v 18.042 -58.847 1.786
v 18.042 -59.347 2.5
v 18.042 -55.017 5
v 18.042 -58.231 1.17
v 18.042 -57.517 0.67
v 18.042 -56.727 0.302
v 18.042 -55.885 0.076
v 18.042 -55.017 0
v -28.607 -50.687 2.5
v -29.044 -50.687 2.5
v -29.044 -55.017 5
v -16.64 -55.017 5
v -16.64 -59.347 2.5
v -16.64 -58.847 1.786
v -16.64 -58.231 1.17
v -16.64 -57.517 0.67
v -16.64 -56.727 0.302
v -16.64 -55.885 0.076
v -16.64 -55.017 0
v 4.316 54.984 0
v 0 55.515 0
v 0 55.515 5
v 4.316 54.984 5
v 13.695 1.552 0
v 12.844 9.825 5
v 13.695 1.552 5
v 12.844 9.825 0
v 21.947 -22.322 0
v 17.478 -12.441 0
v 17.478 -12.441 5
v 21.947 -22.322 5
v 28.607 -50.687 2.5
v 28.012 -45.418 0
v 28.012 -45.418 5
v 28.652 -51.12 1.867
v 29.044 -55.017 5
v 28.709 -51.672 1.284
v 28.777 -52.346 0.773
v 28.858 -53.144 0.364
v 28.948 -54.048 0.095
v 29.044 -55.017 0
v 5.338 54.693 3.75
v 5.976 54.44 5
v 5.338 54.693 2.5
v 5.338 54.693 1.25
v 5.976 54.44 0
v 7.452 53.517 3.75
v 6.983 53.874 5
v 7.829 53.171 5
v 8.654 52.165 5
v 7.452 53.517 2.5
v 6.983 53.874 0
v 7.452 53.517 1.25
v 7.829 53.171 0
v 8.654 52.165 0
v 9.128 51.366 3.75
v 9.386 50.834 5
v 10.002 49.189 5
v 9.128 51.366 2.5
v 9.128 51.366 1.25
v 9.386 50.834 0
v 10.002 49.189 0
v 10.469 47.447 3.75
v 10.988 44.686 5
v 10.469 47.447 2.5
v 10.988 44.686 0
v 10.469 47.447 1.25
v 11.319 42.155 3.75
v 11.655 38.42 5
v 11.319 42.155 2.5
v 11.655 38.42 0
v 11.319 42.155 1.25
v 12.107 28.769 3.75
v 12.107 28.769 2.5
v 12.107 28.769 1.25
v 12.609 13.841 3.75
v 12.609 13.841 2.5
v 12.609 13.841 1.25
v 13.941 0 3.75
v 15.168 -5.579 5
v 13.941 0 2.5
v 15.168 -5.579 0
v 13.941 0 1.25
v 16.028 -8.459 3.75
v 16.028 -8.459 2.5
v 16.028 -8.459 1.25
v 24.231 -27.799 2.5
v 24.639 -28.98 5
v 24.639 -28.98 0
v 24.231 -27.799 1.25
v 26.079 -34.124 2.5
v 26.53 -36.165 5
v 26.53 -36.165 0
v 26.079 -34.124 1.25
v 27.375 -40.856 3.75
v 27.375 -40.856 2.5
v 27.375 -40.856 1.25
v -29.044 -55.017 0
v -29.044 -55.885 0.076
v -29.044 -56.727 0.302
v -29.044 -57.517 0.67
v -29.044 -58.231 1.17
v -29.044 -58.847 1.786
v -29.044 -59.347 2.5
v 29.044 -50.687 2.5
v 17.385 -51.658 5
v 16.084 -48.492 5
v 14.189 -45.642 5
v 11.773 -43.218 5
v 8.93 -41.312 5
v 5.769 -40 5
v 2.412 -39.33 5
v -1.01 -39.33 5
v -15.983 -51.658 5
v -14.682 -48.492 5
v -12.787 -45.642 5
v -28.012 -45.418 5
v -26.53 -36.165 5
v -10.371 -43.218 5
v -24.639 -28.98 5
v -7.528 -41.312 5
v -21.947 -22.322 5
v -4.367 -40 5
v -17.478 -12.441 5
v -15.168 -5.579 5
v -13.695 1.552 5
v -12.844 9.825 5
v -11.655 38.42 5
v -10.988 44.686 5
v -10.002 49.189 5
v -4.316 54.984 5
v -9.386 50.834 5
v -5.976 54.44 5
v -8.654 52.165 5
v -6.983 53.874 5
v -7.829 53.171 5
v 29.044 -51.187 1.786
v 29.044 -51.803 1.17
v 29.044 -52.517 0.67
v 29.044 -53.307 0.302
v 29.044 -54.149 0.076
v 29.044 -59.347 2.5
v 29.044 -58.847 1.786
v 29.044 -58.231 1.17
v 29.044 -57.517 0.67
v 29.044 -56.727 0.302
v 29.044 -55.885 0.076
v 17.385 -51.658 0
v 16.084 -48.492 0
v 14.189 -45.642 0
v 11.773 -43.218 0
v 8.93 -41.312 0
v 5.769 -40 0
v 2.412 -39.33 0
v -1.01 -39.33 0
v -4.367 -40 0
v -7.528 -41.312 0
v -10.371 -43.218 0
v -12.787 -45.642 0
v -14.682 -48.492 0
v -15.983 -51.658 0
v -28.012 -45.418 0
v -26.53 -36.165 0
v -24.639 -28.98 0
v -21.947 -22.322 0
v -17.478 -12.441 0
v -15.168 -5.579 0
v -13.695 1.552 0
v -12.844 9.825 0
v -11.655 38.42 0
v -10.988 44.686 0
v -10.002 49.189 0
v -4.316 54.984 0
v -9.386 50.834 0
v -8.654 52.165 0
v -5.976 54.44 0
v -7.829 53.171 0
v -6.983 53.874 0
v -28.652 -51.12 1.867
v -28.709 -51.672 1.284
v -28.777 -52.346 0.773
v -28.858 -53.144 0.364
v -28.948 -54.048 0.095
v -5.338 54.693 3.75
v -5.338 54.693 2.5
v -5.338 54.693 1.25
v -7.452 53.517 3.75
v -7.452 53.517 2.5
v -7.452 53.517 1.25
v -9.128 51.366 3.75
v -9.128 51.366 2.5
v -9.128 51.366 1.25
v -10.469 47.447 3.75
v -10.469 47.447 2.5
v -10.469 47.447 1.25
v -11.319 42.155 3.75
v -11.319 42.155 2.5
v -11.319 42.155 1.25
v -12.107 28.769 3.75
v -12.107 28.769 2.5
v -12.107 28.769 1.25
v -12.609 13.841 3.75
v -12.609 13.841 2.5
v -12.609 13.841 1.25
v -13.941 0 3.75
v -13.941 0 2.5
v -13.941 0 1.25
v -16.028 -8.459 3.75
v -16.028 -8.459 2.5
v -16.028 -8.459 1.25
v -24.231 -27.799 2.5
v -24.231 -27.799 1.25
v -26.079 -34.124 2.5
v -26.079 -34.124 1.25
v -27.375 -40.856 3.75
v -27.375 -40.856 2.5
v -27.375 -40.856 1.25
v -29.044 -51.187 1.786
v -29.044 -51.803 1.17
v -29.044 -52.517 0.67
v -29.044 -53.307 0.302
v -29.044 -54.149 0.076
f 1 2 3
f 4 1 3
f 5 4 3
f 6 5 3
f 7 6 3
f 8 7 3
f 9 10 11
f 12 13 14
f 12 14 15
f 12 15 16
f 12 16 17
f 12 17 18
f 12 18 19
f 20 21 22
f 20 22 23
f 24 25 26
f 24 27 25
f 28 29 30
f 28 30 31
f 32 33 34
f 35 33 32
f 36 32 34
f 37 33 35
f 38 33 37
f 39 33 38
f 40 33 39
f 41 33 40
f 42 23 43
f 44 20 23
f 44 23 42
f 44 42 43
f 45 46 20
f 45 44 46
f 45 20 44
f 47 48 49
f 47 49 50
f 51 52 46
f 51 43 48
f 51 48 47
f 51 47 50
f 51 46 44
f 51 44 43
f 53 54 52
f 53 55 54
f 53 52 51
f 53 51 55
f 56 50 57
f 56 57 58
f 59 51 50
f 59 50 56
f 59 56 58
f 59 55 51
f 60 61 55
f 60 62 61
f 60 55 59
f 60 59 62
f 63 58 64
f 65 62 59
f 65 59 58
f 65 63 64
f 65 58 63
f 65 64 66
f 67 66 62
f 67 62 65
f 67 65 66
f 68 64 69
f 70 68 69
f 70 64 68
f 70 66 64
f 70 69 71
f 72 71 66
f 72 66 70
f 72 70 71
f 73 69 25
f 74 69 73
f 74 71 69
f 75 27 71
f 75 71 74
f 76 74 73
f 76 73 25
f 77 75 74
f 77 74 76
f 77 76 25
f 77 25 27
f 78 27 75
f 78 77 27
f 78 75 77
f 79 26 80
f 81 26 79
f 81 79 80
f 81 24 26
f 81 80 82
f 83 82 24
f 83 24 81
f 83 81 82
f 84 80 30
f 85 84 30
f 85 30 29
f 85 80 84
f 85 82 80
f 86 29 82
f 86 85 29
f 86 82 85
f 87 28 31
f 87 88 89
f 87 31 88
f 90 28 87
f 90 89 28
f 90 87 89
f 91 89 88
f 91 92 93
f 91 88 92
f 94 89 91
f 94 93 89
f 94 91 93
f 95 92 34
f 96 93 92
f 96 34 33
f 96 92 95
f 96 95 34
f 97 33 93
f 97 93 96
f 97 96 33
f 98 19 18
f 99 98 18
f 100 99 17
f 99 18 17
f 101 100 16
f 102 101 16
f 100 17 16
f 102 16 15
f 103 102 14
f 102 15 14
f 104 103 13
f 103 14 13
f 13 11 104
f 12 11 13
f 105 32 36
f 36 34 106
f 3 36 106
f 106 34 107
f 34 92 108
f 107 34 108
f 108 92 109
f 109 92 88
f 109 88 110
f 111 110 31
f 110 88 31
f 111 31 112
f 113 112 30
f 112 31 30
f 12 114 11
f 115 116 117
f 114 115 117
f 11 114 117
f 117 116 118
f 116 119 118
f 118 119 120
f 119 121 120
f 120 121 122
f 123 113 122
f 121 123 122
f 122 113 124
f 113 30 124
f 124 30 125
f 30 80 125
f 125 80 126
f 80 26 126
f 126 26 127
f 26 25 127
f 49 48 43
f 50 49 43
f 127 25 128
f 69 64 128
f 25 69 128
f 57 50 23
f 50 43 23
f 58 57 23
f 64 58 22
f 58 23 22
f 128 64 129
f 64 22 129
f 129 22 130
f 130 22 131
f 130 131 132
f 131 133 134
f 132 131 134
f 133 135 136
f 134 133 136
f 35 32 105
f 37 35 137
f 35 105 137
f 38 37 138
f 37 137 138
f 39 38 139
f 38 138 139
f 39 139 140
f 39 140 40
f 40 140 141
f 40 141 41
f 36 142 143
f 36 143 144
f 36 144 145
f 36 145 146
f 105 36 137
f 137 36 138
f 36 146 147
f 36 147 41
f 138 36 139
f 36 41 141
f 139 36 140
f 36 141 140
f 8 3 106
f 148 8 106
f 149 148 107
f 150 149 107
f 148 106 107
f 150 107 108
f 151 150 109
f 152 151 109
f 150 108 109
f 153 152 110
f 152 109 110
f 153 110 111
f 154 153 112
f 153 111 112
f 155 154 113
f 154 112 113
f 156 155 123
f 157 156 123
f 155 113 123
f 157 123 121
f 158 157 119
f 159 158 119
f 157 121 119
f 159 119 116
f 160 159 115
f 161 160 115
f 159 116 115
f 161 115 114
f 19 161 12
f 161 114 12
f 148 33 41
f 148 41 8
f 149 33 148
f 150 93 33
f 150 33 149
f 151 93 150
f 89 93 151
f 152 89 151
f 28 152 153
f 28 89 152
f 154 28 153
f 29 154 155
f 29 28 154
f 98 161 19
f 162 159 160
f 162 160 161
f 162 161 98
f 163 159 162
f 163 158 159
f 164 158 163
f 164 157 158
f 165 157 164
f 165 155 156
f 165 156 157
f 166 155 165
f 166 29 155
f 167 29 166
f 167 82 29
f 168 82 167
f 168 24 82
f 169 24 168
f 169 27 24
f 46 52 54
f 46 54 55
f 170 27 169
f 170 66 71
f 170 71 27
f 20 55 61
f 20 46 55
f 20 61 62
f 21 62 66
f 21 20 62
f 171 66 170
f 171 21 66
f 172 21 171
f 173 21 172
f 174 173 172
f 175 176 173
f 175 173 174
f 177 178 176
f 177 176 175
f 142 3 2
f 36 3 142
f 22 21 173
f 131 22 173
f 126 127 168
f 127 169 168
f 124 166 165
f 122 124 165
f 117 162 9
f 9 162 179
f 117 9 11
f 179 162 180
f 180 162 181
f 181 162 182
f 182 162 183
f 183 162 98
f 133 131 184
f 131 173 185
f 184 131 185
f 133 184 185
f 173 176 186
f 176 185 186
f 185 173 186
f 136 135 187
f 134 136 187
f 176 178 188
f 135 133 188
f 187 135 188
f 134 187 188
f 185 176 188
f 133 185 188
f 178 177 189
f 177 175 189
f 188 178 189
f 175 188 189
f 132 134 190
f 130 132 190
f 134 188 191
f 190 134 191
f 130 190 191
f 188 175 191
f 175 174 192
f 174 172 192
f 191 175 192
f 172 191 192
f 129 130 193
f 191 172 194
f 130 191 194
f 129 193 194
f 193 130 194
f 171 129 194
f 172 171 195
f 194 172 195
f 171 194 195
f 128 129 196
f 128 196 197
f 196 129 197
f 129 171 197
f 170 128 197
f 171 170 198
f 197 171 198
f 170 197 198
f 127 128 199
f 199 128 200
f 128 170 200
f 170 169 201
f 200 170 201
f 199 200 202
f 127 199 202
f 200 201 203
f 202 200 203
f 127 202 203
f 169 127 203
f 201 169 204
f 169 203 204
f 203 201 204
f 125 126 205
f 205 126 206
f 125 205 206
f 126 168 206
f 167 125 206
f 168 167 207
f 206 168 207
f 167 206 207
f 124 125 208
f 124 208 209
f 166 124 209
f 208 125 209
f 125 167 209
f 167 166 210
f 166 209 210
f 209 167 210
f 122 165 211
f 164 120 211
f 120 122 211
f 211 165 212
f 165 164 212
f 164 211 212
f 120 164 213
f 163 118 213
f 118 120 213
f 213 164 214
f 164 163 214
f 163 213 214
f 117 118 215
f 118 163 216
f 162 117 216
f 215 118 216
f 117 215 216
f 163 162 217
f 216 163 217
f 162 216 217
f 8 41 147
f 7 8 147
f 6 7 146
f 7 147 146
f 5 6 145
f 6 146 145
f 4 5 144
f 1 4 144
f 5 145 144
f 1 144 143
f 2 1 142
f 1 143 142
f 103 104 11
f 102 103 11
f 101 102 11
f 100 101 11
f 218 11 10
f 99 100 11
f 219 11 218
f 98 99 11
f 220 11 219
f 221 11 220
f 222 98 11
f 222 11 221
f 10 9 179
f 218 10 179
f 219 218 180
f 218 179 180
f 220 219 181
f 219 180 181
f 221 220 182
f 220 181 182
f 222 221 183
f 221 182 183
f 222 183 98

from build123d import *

# Parameters (mm, degrees)
F1_DEPTH      = 5
F3_DEPTH      = 25
F3_FACE_W     = 12.4035850167
F3_FACE_H     = 5
F3_FACE_W_2   = 11.0018514097
F5_ANGLE_BACK = 60
F5_ANGLE      = 120


with BuildPart() as f1:
    # F0 (on Top) → F1 (new body)
    with BuildSketch(Plane.XY):
        with BuildLine():
            add(Edge.make_bspline(
                [(0, 55.5150210857), (3.9831399918, 55.1830865443), (14.5254457518, 54.7088049694), (9.3191643411, -3.5095165584), (26.1631216831, -26.0257248677), (28.0955035048, -45.4406970435), (29.0437303483, -55.0171285868)],
                knots=[0, 0, 0, 0, 0.1504202138, 0.4916228475, 0.7502543955, 1, 1, 1, 1], degree=3))
            add(Edge.make_bspline(
                [(0, 55.5150210857), (-3.9831399918, 55.1830865443), (-14.5254457518, 54.7088049694), (-9.3191643411, -3.5095165584), (-26.1631216831, -26.0257248677), (-28.0955035048, -45.4406970435), (-29.0437303483, -55.0171285868)],
                knots=[0, 0, 0, 0, 0.1504202138, 0.4916228475, 0.7502543955, 1, 1, 1, 1], degree=3))
            Line((-29.0437303483, -55.0171285868), (0, -55.0171285868))
            Line((0, -55.0171285868), (29.0437303483, -55.0171285868))
        make_face()
    extrude(amount=F1_DEPTH)

    # F2 (on face) → F3 (cut)
    with BuildSketch(Plane.XY.offset(5)):
        with BuildLine():
            Line((-16.6401453316, -55.0171285868), (18.0418789387, -55.0171285868))
            ThreePointArc((18.0418789387, -55.0171285868), (0.7008668035, -39.2459911372), (-16.6401453316, -55.0171285868))
        make_face()
    extrude(amount=-F3_DEPTH, mode=Mode.SUBTRACT)

    # F3_face (on face) → F5 (revolve)
    with BuildSketch(Plane(origin=(-22.84193784, -55.0171285868, 2.5), x_dir=(1, 0, 0), z_dir=(0, -1, 0)), mode=Mode.PRIVATE) as f5_sk:
        Rectangle(F3_FACE_W, F3_FACE_H)
        with Locations((46.3847424835, 0)):
            Rectangle(F3_FACE_W_2, F3_FACE_H)
    revolve(f5_sk.sketch.rotate(Axis((-22.84193784, -55.0171285868, 5), (-1, 0, 0)), -F5_ANGLE_BACK), axis=Axis((-22.84193784, -55.0171285868, 5), (-1, 0, 0)), revolution_arc=F5_ANGLE)


solid = f1.part
